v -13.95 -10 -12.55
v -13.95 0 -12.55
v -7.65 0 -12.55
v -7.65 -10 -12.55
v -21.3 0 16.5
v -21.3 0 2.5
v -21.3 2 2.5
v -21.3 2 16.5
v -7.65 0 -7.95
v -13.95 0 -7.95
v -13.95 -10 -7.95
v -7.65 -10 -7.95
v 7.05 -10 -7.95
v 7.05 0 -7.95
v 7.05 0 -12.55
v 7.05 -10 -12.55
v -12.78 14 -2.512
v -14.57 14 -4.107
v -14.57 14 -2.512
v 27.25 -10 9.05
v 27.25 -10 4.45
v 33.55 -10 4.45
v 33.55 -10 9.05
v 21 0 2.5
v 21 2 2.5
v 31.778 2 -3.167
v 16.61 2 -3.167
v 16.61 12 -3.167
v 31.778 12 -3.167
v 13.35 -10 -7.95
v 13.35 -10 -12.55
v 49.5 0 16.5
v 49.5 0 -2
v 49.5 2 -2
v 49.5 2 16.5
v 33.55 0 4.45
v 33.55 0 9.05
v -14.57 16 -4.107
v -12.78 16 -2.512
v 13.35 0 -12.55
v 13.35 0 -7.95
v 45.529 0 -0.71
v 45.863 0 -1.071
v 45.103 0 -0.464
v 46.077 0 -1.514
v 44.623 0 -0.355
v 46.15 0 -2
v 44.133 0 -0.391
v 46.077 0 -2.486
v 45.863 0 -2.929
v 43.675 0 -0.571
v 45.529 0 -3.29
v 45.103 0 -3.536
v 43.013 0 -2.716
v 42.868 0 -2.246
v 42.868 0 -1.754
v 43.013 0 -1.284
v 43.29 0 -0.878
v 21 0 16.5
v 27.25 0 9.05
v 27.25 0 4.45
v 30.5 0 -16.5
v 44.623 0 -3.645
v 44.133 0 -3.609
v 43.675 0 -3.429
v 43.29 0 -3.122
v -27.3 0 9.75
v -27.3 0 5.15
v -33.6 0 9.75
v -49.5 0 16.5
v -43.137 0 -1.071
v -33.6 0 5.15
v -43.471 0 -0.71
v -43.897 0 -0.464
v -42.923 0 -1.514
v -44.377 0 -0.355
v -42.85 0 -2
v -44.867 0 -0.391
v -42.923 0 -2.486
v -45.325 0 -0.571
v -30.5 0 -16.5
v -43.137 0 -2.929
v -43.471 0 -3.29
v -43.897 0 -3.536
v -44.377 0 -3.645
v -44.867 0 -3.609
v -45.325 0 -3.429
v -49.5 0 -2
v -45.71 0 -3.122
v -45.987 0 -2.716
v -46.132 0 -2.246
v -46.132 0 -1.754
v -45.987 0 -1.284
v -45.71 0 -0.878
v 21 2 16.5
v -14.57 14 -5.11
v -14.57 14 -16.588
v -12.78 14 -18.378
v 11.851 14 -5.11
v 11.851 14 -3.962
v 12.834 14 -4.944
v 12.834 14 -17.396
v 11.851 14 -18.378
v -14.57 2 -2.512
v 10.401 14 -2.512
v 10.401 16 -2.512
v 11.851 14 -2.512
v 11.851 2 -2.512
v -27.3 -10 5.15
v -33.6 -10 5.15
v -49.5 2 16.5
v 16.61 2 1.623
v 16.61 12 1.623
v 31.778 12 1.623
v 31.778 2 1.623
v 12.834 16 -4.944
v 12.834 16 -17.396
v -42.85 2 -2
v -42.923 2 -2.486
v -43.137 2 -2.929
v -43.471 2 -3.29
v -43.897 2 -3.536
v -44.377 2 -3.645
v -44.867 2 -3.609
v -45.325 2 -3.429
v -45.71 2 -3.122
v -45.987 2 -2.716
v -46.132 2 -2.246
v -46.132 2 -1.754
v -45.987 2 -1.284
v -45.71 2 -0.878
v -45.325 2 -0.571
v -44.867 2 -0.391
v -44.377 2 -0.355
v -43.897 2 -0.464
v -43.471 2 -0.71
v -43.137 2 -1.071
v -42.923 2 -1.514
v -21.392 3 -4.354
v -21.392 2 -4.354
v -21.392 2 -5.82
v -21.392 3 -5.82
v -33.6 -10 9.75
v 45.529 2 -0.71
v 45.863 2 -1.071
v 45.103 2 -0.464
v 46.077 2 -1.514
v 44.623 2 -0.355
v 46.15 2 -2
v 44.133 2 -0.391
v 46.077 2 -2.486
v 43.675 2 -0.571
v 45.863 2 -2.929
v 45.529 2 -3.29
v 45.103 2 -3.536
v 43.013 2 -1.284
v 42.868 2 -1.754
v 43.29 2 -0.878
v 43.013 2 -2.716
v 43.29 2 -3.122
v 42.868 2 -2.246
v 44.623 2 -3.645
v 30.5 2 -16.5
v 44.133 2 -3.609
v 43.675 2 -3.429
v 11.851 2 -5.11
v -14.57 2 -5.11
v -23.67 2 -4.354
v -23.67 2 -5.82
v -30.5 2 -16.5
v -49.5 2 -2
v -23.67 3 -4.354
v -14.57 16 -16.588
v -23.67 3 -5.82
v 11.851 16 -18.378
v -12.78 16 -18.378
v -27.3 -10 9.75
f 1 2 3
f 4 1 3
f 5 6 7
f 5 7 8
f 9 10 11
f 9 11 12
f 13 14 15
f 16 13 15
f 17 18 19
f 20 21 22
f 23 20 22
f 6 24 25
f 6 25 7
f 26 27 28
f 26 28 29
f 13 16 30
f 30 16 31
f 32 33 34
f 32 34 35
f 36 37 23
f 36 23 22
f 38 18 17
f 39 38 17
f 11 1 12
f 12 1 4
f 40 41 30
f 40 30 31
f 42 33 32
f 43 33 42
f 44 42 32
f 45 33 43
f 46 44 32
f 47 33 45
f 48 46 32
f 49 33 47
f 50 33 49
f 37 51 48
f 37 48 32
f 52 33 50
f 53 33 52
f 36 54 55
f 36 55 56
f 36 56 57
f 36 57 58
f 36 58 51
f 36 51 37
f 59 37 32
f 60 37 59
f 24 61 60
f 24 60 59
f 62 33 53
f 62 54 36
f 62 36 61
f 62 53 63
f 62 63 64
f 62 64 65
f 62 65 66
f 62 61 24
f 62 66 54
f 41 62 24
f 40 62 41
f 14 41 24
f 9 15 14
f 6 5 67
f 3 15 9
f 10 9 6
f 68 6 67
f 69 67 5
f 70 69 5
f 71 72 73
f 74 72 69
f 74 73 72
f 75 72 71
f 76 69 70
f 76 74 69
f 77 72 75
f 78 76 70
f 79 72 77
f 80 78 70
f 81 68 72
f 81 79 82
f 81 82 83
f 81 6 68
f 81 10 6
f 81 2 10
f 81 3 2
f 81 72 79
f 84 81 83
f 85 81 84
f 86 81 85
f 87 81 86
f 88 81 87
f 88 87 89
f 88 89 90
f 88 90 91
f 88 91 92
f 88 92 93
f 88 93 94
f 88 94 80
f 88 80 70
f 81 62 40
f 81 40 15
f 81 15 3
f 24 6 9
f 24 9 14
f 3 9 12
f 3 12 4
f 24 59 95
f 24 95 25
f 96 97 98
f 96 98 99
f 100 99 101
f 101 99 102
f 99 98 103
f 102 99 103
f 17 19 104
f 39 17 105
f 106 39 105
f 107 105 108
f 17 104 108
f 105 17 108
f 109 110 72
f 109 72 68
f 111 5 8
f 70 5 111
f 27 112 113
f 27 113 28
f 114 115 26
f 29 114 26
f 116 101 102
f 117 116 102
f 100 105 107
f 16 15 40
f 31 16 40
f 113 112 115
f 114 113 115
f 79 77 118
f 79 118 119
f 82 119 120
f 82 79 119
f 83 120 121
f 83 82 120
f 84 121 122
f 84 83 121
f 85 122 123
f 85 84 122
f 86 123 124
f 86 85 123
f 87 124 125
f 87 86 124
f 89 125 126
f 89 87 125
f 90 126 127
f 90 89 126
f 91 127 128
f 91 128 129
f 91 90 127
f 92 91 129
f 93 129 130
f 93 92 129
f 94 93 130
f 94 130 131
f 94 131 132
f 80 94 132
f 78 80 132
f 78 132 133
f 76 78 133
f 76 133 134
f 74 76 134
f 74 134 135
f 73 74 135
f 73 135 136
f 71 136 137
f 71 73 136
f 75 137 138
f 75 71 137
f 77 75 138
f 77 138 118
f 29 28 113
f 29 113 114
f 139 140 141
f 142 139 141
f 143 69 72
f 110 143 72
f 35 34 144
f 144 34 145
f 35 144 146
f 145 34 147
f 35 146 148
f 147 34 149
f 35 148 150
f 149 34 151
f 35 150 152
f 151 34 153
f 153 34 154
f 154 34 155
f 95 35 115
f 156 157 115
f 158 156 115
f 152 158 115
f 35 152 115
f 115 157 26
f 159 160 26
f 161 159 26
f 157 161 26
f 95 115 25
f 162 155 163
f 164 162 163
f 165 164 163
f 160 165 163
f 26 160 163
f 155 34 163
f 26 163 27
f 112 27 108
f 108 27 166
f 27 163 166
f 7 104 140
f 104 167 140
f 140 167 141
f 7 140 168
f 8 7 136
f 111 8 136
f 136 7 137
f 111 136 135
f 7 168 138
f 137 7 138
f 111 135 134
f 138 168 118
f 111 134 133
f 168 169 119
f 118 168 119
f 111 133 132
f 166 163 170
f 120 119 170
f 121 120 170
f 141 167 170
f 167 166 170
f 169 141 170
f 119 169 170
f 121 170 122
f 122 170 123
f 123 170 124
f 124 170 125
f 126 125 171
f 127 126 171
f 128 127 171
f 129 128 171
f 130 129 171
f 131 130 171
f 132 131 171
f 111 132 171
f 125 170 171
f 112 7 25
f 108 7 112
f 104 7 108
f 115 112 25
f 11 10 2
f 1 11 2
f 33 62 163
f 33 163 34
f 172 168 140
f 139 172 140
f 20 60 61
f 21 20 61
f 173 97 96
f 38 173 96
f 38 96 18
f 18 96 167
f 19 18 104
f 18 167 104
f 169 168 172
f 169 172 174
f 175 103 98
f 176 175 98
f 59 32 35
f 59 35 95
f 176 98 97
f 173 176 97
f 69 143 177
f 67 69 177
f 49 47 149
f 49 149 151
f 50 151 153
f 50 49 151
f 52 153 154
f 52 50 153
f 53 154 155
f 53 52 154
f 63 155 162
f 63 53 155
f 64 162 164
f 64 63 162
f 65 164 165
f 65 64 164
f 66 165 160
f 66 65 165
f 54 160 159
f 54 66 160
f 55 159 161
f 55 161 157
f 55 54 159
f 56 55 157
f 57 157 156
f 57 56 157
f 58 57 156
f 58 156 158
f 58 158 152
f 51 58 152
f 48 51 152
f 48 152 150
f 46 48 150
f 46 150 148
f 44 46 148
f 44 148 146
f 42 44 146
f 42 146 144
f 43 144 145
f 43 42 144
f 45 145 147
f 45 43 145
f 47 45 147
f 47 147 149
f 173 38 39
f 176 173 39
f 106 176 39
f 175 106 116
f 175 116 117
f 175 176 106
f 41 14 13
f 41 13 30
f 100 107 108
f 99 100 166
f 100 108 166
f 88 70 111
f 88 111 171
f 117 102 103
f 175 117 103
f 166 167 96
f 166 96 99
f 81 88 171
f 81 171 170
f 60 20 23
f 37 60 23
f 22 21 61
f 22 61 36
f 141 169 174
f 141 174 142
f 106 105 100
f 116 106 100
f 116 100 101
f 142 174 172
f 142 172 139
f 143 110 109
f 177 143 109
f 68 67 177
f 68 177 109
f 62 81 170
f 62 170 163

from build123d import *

# Parameters (mm, degrees)
ESBO_O1_R                = 1.65
RESSALTO_EXTRUS_O1_DEPTH = 2
ESBO_O1_3_W              = 6.3
ESBO_O1_3_H              = 4.6
RESSALTO_EXTRUS_O2_DEPTH = 10
ESBO_O2_W                = 26.421659043
ESBO_O2_H                = 2.598510054
RESSALTO_EXTRUS_O3_DEPTH = 12
RESSALTO_EXTRUS_O4_DEPTH = 2
ESBO_O4_W                = 15.168134441
ESBO_O4_H                = 4.790416537
RESSALTO_EXTRUS_O5_DEPTH = 10
ESBO_O5_W                = 2.278476724
ESBO_O5_H                = 1.465715939
RESSALTO_EXTRUS_O6_DEPTH = 1


with BuildPart() as part:
    # Esboço1 → Ressalto-extrusão1 (new body)
    with BuildSketch(Plane(origin=(0, 0, 0), x_dir=(1, 0, 0), z_dir=(0, 1, 0))):
        Polygon((-49.5, 2), (-30.5, 16.5), (30.5, 16.5), (49.5, 2), (49.5, -16.5), (21, -16.5), (21, -2.5), (-21.3, -2.5), (-21.3, -16.5), (-49.5, -16.5), align=None)
        with Locations((-44.5, 2)):
            Circle(ESBO_O1_R, mode=Mode.SUBTRACT)
        with Locations((44.5, 2)):
            Circle(ESBO_O1_R, mode=Mode.SUBTRACT)
    extrude(amount=RESSALTO_EXTRUS_O1_DEPTH)

    # Esboço1<3> → Ressalto-extrusão2 (add)
    with BuildSketch(Plane(origin=(0, 0, 0), x_dir=(1, 0, 0), z_dir=(0, 1, 0))):
        with Locations((-30.45, -7.45)):
            Rectangle(ESBO_O1_3_W, ESBO_O1_3_H)
        with Locations((-10.8, 10.25)):
            Rectangle(ESBO_O1_3_W, ESBO_O1_3_H)
        with Locations((10.2, 10.25)):
            Rectangle(ESBO_O1_3_W, ESBO_O1_3_H)
        with Locations((30.4, -6.75)):
            Rectangle(ESBO_O1_3_W, ESBO_O1_3_H)
    extrude(amount=-RESSALTO_EXTRUS_O2_DEPTH)

    # Esboço2 → Ressalto-extrusão3 (add)
    with BuildSketch(Plane(origin=(0, 2, 0), x_dir=(1, 0, 0), z_dir=(0, 1, 0))):
        with Locations((-1.359424961, 3.810785195)):
            Rectangle(ESBO_O2_W, ESBO_O2_H)
    extrude(amount=RESSALTO_EXTRUS_O3_DEPTH)

    # Esboço3 → Ressalto-extrusão4 (add)
    with BuildSketch(Plane(origin=(0, 14, 0), x_dir=(1, 0, 0), z_dir=(0, 1, 0))):
        Polygon((-12.779725254, 2.511530168), (10.40079667, 2.511530168), (12.833618236, 4.944351733), (12.833618236, 17.396051346), (11.851404561, 18.378265021), (-12.779725254, 18.378265021), (-14.570254482, 16.587735794), (-14.570254482, 4.107082692), align=None)
    extrude(amount=RESSALTO_EXTRUS_O4_DEPTH)

    # Esboço4 → Ressalto-extrusão5 (add)
    with BuildSketch(Plane(origin=(0, 2, 0), x_dir=(1, 0, 0), z_dir=(0, 1, 0))):
        with Locations((24.193900659, 0.772233303)):
            Rectangle(ESBO_O4_W, ESBO_O4_H)
    extrude(amount=RESSALTO_EXTRUS_O5_DEPTH)

    # Esboço5 → Ressalto-extrusão6 (add)
    with BuildSketch(Plane(origin=(0, 2, 0), x_dir=(1, 0, 0), z_dir=(0, 1, 0))):
        with Locations((-22.531195516, 5.087051721)):
            Rectangle(ESBO_O5_W, ESBO_O5_H)
    extrude(amount=RESSALTO_EXTRUS_O6_DEPTH)


solid = part.part
